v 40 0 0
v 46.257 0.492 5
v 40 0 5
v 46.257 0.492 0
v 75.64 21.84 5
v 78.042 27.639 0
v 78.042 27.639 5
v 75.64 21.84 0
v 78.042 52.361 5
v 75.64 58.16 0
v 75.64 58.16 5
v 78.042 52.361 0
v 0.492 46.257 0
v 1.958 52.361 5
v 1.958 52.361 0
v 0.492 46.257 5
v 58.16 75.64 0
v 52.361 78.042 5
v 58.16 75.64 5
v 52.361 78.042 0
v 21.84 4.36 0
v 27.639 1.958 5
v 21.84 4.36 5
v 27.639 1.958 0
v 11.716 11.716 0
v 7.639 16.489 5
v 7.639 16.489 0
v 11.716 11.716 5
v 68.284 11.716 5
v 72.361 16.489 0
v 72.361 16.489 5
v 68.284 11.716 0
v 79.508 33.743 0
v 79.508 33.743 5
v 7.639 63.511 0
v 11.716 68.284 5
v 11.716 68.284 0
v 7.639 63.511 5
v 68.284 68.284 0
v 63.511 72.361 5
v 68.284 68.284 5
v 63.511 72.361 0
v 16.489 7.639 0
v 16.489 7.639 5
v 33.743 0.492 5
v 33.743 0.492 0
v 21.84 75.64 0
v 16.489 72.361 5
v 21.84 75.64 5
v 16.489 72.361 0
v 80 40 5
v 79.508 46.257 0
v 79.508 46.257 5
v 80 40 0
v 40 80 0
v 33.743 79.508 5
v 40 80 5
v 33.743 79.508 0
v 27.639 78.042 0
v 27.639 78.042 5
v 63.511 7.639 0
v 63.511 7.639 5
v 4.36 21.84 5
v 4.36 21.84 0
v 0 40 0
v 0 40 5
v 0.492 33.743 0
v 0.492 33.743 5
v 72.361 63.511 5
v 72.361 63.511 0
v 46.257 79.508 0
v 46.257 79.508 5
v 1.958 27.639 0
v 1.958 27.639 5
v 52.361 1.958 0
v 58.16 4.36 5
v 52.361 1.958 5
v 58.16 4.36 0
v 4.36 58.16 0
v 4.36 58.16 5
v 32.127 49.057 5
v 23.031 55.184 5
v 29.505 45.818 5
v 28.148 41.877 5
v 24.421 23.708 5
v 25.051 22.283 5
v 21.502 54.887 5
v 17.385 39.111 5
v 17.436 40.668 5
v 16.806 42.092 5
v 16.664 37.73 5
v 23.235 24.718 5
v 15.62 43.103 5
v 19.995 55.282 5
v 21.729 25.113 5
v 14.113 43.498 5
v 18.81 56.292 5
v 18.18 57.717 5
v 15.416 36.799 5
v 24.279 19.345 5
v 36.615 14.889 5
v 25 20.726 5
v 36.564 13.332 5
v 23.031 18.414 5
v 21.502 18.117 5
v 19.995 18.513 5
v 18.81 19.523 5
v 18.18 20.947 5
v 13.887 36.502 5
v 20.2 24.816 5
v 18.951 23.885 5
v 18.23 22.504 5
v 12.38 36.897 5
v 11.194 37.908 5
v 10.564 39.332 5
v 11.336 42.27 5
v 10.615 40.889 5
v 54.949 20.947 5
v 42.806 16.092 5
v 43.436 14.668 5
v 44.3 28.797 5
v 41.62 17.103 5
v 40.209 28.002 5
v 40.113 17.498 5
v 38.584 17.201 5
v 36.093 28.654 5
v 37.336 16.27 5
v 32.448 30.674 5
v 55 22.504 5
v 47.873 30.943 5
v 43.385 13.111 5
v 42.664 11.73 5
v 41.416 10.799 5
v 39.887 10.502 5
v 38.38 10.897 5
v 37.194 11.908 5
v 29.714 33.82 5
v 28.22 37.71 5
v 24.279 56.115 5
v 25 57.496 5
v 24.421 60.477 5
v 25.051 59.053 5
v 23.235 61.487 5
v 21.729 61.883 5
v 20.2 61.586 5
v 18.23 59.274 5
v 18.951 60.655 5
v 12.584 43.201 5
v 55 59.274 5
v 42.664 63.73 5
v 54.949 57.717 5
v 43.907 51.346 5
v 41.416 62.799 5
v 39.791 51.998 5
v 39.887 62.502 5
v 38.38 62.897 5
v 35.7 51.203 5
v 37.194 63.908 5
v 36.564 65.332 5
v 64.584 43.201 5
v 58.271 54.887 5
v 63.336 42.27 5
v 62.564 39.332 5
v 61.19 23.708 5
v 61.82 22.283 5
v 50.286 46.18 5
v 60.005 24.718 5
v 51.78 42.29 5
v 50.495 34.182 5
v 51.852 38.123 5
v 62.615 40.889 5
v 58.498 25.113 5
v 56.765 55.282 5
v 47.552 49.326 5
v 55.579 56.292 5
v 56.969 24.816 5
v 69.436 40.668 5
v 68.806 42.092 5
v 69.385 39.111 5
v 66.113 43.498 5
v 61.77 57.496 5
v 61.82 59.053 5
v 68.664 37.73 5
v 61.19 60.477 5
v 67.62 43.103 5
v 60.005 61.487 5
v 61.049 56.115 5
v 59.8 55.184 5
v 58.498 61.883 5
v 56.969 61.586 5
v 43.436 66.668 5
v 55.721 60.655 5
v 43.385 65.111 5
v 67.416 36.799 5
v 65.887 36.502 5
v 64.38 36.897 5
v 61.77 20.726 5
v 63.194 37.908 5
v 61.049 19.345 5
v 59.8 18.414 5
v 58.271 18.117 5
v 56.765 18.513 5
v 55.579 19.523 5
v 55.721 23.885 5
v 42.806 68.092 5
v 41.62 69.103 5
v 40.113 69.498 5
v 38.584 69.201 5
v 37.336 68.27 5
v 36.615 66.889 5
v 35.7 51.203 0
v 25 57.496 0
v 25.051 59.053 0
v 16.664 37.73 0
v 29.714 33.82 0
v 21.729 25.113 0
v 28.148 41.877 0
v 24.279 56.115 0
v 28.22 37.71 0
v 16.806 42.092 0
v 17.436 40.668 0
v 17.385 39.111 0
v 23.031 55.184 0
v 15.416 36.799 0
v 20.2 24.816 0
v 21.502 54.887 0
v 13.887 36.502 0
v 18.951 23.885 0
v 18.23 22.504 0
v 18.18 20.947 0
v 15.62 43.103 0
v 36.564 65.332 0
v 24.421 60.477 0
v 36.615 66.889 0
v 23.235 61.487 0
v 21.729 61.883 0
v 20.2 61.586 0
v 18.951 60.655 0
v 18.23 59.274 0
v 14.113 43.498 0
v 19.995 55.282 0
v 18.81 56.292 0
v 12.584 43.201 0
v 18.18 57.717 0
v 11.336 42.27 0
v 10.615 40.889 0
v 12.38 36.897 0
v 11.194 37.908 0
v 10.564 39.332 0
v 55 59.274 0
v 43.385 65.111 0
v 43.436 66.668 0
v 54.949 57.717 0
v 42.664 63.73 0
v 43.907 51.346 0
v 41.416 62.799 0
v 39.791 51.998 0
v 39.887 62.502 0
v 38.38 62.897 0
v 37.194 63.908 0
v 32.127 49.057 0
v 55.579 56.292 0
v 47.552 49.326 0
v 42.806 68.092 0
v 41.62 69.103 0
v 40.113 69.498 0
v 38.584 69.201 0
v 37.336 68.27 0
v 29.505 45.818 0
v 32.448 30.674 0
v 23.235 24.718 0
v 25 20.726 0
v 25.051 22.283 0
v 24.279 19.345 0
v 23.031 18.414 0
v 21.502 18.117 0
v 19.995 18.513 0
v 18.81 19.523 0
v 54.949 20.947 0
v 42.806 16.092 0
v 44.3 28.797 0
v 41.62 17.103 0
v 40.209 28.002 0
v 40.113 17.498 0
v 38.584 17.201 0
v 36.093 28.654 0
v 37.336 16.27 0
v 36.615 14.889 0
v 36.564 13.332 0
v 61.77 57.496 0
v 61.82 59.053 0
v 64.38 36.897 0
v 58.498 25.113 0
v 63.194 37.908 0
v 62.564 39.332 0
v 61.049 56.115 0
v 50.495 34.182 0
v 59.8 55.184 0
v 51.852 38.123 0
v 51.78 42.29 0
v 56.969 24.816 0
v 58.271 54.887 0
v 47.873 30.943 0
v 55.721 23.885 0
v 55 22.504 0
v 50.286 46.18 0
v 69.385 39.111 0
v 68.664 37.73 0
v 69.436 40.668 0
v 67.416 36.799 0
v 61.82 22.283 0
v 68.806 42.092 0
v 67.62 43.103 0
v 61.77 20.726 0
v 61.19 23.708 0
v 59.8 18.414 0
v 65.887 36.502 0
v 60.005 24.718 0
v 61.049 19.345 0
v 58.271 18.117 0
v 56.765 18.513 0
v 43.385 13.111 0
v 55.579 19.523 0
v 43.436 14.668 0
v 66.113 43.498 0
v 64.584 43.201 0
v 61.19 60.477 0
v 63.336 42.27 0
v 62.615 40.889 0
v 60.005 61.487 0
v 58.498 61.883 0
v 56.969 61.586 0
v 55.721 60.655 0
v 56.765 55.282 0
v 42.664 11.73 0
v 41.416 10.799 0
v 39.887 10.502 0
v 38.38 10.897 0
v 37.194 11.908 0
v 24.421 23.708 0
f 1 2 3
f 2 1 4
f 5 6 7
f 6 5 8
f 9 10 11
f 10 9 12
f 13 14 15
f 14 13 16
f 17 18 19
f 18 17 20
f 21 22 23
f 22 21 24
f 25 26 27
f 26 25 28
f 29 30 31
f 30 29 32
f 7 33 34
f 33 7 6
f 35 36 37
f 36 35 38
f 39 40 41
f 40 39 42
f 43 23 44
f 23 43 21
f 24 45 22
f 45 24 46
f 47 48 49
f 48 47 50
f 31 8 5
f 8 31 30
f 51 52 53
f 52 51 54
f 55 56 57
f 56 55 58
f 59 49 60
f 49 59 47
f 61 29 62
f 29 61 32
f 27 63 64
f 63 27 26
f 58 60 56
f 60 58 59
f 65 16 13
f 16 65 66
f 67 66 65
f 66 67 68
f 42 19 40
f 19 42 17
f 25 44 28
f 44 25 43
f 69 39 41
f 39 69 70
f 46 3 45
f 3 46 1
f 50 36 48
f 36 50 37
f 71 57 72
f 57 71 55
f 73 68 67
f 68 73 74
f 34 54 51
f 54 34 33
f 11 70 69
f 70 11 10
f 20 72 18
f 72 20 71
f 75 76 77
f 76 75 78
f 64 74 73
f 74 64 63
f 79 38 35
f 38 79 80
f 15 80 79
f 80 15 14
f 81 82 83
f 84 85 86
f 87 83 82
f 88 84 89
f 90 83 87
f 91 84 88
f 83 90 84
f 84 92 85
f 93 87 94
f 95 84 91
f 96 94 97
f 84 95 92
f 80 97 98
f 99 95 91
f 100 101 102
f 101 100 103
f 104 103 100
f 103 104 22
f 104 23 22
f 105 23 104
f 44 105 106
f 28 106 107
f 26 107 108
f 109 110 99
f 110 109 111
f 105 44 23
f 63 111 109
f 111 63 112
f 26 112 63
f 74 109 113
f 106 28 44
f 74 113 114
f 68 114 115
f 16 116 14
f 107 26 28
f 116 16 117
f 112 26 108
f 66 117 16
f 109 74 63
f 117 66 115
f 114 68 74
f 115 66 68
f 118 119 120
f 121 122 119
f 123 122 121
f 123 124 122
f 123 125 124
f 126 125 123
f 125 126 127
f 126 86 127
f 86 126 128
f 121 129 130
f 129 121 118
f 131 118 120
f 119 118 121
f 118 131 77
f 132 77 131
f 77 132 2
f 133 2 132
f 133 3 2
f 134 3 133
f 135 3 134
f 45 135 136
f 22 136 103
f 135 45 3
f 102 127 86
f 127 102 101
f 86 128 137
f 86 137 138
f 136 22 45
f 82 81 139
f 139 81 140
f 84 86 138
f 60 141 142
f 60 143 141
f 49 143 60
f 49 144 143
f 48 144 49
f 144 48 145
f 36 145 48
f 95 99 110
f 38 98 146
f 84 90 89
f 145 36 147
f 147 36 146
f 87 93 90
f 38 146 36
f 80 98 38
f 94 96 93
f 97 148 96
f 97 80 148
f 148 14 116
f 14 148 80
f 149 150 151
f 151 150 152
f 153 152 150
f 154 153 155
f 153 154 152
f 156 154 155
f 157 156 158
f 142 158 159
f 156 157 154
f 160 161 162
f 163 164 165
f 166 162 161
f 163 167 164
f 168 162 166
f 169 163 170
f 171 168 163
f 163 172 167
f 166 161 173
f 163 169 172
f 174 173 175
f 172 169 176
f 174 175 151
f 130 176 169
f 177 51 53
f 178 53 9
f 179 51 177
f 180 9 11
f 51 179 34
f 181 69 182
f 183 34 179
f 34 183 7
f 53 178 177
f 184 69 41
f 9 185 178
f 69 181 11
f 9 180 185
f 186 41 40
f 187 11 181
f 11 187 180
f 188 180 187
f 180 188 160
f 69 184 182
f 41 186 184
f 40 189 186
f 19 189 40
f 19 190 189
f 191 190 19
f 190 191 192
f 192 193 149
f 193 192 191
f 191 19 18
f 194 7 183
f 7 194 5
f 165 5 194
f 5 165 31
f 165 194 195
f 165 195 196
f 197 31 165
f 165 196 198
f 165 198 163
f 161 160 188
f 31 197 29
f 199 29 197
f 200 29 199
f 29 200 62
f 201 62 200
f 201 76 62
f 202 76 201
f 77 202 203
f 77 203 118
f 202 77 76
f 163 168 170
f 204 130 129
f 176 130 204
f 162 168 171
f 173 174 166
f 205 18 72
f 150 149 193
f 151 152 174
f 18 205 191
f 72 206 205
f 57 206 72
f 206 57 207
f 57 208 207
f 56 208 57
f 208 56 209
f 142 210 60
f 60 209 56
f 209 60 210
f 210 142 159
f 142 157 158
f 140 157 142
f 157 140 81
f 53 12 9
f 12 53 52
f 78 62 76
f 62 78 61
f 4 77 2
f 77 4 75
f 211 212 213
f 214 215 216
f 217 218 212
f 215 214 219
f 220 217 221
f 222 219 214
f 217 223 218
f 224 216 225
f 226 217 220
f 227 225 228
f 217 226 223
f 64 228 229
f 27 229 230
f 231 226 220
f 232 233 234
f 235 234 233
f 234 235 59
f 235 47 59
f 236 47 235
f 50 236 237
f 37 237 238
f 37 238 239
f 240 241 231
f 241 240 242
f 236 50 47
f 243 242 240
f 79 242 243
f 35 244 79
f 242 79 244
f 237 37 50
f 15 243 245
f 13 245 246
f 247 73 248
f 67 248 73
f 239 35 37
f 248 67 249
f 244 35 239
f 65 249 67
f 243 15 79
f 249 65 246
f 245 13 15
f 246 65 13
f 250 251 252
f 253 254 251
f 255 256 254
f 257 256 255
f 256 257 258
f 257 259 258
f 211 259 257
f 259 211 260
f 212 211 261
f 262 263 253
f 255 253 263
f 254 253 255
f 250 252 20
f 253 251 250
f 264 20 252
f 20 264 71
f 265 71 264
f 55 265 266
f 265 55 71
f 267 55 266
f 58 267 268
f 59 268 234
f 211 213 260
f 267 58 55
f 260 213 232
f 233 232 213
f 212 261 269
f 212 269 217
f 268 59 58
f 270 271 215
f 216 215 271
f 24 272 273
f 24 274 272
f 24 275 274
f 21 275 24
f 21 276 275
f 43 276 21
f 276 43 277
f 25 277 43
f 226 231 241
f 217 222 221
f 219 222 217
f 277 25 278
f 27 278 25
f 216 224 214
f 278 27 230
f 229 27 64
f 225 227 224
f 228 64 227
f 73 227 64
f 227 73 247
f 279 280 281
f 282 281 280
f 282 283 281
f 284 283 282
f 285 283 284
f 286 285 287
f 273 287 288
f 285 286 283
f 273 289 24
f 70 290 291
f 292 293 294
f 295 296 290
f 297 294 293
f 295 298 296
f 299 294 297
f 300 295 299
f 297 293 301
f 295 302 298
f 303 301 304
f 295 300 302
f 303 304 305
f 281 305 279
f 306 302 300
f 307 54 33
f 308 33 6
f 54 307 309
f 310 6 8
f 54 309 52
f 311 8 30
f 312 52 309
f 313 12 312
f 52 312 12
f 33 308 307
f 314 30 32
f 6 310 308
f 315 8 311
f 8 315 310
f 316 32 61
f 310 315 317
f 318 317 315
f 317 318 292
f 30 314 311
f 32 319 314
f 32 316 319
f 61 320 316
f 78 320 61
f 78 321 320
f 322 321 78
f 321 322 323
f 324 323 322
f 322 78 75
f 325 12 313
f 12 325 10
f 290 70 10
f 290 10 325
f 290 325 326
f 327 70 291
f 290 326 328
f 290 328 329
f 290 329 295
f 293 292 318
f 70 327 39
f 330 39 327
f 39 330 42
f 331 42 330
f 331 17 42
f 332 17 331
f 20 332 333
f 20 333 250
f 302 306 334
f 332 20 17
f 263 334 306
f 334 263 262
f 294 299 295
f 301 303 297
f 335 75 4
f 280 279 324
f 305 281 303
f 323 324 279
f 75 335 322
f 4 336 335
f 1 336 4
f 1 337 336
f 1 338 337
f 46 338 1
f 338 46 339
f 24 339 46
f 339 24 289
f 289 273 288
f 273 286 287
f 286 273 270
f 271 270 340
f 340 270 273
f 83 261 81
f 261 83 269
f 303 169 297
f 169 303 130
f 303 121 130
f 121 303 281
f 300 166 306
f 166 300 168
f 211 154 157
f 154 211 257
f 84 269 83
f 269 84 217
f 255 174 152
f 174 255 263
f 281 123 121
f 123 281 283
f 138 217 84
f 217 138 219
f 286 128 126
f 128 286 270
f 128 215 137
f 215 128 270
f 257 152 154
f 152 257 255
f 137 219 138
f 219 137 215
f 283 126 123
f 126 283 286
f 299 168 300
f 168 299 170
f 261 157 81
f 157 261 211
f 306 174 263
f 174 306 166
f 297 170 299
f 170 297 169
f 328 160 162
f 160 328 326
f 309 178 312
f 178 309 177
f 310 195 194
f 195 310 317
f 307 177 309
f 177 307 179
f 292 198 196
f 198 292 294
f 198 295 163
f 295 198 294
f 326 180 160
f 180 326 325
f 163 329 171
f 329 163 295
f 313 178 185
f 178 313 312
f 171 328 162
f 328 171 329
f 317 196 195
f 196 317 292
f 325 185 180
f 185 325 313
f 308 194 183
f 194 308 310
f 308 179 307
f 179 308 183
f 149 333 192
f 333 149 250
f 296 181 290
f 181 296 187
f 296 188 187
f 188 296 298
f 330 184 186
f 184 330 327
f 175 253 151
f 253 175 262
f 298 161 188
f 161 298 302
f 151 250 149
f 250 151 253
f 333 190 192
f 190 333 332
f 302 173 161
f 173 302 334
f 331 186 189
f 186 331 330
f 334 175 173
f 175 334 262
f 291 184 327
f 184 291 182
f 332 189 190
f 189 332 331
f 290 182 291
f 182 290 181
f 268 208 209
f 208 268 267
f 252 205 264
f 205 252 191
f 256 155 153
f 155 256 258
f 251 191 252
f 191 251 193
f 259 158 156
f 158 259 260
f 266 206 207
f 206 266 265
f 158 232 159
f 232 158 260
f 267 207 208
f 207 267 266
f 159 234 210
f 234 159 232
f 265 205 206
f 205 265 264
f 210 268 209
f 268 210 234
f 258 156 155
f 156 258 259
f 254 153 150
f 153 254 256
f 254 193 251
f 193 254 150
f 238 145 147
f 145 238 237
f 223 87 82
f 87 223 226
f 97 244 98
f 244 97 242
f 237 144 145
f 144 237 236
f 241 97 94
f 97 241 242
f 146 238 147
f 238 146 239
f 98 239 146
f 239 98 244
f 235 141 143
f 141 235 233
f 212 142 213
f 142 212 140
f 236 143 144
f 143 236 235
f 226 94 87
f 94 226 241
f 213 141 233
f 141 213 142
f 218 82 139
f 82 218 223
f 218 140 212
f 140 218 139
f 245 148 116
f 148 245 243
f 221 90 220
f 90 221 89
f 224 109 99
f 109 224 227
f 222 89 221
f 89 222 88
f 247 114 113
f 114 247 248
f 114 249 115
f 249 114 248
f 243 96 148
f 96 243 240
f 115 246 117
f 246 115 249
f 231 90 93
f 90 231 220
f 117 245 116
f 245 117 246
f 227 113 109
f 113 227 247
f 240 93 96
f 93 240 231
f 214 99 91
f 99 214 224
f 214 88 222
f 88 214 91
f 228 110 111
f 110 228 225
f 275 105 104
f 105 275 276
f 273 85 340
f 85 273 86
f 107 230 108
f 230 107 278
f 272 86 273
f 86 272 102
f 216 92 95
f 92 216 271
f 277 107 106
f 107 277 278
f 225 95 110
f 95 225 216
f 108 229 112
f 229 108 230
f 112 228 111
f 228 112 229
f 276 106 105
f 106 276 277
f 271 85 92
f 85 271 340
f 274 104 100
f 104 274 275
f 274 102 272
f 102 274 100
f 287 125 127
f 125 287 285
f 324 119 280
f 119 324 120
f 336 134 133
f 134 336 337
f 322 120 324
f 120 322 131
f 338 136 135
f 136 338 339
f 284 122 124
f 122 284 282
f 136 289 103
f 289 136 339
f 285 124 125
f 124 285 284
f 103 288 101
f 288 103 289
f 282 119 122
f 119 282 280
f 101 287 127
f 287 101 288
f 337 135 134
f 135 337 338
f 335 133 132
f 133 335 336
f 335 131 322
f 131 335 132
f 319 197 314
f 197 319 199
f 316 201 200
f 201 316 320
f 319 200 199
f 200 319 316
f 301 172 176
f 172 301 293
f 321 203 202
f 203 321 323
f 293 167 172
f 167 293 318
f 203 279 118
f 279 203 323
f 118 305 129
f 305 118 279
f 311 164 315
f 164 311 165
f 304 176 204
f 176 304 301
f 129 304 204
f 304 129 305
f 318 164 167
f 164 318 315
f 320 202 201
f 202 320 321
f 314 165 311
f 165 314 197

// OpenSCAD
$fn = 32;

// ----------------------------------------------------------------------
// Spacer plate: round flange R40, 8 bolts
// ----------------------------------------------------------------------

// --- parameters (mm) ---
bore_r = 12;              // centre bore radius
bolt_r = 3.5;             // bolt hole radius
plate_t = 5;              // plate thickness, Z (extrusion height)
flange_r = 40;            // flange radius
n_bolt = 8;               // bolt hole count
ring_r = 26;              // bolt circle radius

profile = [[80, 40], [79.508, 46.257], [78.042, 52.361], [75.64, 58.16], [72.361, 63.511], [68.284, 68.284], [63.511, 72.361], [58.16, 75.64], [52.361, 78.042], [46.257, 79.508], [40, 80], [33.743, 79.508], [27.639, 78.042], [21.84, 75.64], [16.489, 72.361], [11.716, 68.284], [7.639, 63.511], [4.36, 58.16], [1.958, 52.361], [0.492, 46.257], [0, 40], [0.492, 33.743], [1.958, 27.639], [4.36, 21.84], [7.639, 16.489], [11.716, 11.716], [16.489, 7.639], [21.84, 4.36], [27.639, 1.958], [33.743, 0.492], [40, 0], [46.257, 0.492], [52.361, 1.958], [58.16, 4.36], [63.511, 7.639], [68.284, 11.716], [72.361, 16.489], [75.64, 21.84], [78.042, 27.639], [79.508, 33.743]];  // primary outline, 40 points, counter clockwise
void_1 = [[51.78, 42.29], [50.286, 46.18], [47.552, 49.326], [43.907, 51.346], [39.791, 51.998], [35.7, 51.203], [32.127, 49.057], [29.505, 45.818], [28.148, 41.877], [28.22, 37.71], [29.714, 33.82], [32.448, 30.674], [36.093, 28.654], [40.209, 28.002], [44.3, 28.797], [47.873, 30.943], [50.495, 34.182], [51.852, 38.123]];  // centre bore, 18 points
void_2 = [[69.436, 40.668], [68.806, 42.092], [67.62, 43.103], [66.113, 43.498], [64.584, 43.201], [63.336, 42.27], [62.615, 40.889], [62.564, 39.332], [63.194, 37.908], [64.38, 36.897], [65.887, 36.502], [67.416, 36.799], [68.664, 37.73], [69.385, 39.111]];  // bolt hole 1, 14 points
void_3 = [[61.82, 59.053], [61.19, 60.477], [60.005, 61.487], [58.498, 61.883], [56.969, 61.586], [55.721, 60.655], [55, 59.274], [54.949, 57.717], [55.579, 56.292], [56.765, 55.282], [58.271, 54.887], [59.8, 55.184], [61.049, 56.115], [61.77, 57.496]];  // bolt hole 2, 14 points
void_4 = [[43.436, 66.668], [42.806, 68.092], [41.62, 69.103], [40.113, 69.498], [38.584, 69.201], [37.336, 68.27], [36.615, 66.889], [36.564, 65.332], [37.194, 63.908], [38.38, 62.897], [39.887, 62.502], [41.416, 62.799], [42.664, 63.73], [43.385, 65.111]];  // bolt hole 3, 14 points
void_5 = [[25.051, 59.053], [24.421, 60.477], [23.235, 61.487], [21.729, 61.883], [20.2, 61.586], [18.951, 60.655], [18.23, 59.274], [18.18, 57.717], [18.81, 56.292], [19.995, 55.282], [21.502, 54.887], [23.031, 55.184], [24.279, 56.115], [25, 57.496]];  // bolt hole 4, 14 points
void_6 = [[17.436, 40.668], [16.806, 42.092], [15.62, 43.103], [14.113, 43.498], [12.584, 43.201], [11.336, 42.27], [10.615, 40.889], [10.564, 39.332], [11.194, 37.908], [12.38, 36.897], [13.887, 36.502], [15.416, 36.799], [16.664, 37.73], [17.385, 39.111]];  // bolt hole 5, 14 points
void_7 = [[25.051, 22.283], [24.421, 23.708], [23.235, 24.718], [21.729, 25.113], [20.2, 24.816], [18.951, 23.885], [18.23, 22.504], [18.18, 20.947], [18.81, 19.523], [19.995, 18.513], [21.502, 18.117], [23.031, 18.414], [24.279, 19.345], [25, 20.726]];  // bolt hole 6, 14 points
void_8 = [[43.436, 14.668], [42.806, 16.092], [41.62, 17.103], [40.113, 17.498], [38.584, 17.201], [37.336, 16.27], [36.615, 14.889], [36.564, 13.332], [37.194, 11.908], [38.38, 10.897], [39.887, 10.502], [41.416, 10.799], [42.664, 11.73], [43.385, 13.111]];  // bolt hole 7, 14 points
void_9 = [[61.82, 22.283], [61.19, 23.708], [60.005, 24.718], [58.498, 25.113], [56.969, 24.816], [55.721, 23.885], [55, 22.504], [54.949, 20.947], [55.579, 19.523], [56.765, 18.513], [58.271, 18.117], [59.8, 18.414], [61.049, 19.345], [61.77, 20.726]];  // bolt hole 8, 14 points

// --- the one profile operation ---
difference() {
  linear_extrude(height = plate_t) polygon(points = profile);
  translate([0, 0, -1])
    linear_extrude(height = plate_t + 2) polygon(points = void_1);
  translate([0, 0, -1])
    linear_extrude(height = plate_t + 2) polygon(points = void_2);
  translate([0, 0, -1])
    linear_extrude(height = plate_t + 2) polygon(points = void_3);
  translate([0, 0, -1])
    linear_extrude(height = plate_t + 2) polygon(points = void_4);
  translate([0, 0, -1])
    linear_extrude(height = plate_t + 2) polygon(points = void_5);
  translate([0, 0, -1])
    linear_extrude(height = plate_t + 2) polygon(points = void_6);
  translate([0, 0, -1])
    linear_extrude(height = plate_t + 2) polygon(points = void_7);
  translate([0, 0, -1])
    linear_extrude(height = plate_t + 2) polygon(points = void_8);
  translate([0, 0, -1])
    linear_extrude(height = plate_t + 2) polygon(points = void_9);
}
